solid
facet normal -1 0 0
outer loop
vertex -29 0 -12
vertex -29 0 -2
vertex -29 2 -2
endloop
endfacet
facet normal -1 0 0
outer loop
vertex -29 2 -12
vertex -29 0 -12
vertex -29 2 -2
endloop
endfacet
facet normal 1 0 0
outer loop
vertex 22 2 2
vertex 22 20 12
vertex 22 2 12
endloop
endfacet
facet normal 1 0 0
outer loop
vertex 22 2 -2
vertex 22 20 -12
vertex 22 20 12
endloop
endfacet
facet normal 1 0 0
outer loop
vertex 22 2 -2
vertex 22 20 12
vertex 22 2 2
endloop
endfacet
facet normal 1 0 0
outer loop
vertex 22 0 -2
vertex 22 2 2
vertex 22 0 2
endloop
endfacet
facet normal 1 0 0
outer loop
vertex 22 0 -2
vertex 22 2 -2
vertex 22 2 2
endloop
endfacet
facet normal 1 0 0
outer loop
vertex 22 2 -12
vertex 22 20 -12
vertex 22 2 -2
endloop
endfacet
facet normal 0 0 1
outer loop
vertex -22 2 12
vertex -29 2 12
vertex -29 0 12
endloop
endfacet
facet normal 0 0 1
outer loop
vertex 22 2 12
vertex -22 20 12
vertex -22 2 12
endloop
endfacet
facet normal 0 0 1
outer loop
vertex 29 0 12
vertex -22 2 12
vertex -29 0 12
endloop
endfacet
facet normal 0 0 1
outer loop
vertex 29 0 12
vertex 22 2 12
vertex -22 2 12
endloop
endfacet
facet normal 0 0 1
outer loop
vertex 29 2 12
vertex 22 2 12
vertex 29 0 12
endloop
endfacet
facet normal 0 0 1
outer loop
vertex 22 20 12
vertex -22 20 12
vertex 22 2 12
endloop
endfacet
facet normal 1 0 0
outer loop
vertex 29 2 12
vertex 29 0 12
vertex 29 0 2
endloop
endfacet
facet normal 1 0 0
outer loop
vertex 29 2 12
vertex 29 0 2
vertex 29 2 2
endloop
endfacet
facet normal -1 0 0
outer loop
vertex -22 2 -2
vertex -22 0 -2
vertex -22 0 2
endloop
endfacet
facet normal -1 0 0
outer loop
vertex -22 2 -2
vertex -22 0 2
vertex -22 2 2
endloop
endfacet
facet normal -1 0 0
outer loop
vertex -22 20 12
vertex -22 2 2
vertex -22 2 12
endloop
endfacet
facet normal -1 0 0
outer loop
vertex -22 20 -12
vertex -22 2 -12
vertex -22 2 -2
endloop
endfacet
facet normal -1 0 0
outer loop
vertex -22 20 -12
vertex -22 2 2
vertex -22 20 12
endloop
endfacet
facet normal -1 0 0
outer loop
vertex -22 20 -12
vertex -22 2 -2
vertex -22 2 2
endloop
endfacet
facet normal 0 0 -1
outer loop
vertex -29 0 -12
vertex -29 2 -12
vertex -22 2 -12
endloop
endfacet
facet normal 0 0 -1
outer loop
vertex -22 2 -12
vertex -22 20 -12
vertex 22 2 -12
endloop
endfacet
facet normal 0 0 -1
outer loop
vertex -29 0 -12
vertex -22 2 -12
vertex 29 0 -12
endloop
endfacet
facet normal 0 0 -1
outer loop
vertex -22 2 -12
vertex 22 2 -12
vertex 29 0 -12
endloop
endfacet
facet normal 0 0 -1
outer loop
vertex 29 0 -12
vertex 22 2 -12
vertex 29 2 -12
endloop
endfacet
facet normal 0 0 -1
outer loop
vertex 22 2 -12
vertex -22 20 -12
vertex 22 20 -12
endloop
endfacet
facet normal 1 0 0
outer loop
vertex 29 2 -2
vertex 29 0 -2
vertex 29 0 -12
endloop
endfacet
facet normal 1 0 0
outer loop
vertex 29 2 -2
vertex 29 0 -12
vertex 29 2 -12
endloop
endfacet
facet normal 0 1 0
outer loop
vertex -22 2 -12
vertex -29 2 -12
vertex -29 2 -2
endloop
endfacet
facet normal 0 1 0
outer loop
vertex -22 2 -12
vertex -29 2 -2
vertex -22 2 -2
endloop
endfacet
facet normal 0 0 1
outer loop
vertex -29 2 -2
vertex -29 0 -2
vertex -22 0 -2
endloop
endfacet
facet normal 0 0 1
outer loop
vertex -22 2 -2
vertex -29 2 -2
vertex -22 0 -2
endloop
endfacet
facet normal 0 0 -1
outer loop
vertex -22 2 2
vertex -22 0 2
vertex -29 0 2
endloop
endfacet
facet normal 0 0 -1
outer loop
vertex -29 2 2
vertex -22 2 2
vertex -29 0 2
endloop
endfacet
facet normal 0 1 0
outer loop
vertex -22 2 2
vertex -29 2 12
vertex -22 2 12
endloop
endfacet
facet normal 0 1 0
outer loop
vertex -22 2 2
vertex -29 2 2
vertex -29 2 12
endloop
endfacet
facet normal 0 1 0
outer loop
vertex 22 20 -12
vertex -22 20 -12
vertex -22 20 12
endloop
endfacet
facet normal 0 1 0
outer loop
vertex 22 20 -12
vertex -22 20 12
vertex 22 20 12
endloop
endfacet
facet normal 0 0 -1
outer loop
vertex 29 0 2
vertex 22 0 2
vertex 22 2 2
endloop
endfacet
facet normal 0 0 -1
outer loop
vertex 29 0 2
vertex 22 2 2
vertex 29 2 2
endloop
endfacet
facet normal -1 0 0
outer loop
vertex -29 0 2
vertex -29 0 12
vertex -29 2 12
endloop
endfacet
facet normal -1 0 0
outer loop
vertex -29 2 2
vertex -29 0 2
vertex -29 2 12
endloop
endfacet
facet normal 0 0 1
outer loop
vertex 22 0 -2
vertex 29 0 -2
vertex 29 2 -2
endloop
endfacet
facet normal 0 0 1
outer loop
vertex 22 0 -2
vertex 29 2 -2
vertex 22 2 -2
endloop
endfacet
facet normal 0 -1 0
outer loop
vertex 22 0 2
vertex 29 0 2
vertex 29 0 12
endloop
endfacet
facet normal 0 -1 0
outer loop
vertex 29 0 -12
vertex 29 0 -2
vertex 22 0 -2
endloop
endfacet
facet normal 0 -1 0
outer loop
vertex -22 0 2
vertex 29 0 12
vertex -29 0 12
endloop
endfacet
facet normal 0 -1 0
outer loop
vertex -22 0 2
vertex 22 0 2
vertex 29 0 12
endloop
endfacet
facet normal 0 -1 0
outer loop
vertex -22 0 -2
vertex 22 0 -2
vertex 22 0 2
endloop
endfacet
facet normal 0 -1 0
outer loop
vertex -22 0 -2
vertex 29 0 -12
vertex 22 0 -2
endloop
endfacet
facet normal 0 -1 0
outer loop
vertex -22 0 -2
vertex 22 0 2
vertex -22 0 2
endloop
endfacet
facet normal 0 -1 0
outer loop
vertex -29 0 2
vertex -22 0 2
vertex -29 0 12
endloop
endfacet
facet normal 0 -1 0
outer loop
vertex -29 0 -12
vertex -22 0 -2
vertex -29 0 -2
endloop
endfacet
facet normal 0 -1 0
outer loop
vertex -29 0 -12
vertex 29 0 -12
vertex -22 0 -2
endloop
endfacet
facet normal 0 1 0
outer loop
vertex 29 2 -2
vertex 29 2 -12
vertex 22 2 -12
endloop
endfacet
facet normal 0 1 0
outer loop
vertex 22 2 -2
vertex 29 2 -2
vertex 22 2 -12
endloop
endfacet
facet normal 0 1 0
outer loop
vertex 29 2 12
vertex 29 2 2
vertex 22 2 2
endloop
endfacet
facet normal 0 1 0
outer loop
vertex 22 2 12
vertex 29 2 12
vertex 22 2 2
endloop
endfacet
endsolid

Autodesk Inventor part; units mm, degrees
ref_plane "YZ Plane" through (0, 0, 0) normal (1, 0, 0) x (0, 1, 0)
ref_plane "XZ Plane" through (0, 0, 0) normal (0, 1, 0) x (-1, 0, 0)
ref_plane "XY Plane" through (0, 0, 0) normal (0, 0, 1) x (1, 0, 0)
sketch "Sketch1" plane through (0, 0, 0) normal (0, 0, 1) x (1, 0, 0)
  line L0 (-22, 20) -> (22, 20)
  line L1 (22, 20) -> (22, 0)
  line L2 (22, 0) -> (-22, 0)
  line L3 (-22, 0) -> (-22, 20)
  line L4 (-22, 20) -> (22, 0) construction
  line L5 (22, 20) -> (-22, 0) construction
  line L6 (-29, 2) -> (-22, 2)
  line L7 (-22, 2) -> (-22, 0)
  line L8 (-22, 0) -> (-29, 0)
  line L9 (-29, 0) -> (-29, 2)
  line L10 (-29, 2) -> (-22, 0) construction
  line L11 (-22, 2) -> (-29, 0) construction
  line L12 (29, 2) -> (22, 2)
  line L13 (22, 2) -> (22, 0)
  line L14 (22, 0) -> (29, 0)
  line L15 (29, 0) -> (29, 2)
  line L16 (29, 2) -> (22, 0) construction
  line L17 (22, 2) -> (29, 0) construction
  point P0 (0, 0)
  point P1 (0, 10)
  point P2 (-25.5, 1)
  point P3 (25.5, 1)
  dimension "d0" = 58
  dimension "d1" = 20
  dimension "d2" = 2
  dimension "d3" = 44
extrude "Extrusion1" add sketch "Sketch1" along normal mid plane 24
sketch "Sketch2" plane through (-29, 0, 12) normal (0, -1, 0) x (1, 0, 0)
  line L0 (58, -24) -> (58, 0) projected
  line L1 (51, -10) -> (58, -10)
  line L2 (58, -10) -> (58, -14)
  line L3 (58, -14) -> (51, -14)
  line L4 (51, -14) -> (51, -10)
  line L5 (51, -10) -> (58, -14) construction
  line L6 (58, -10) -> (51, -14) construction
  line L7 (0, -24) -> (0, 0) projected
  line L8 (7, -10) -> (0, -10)
  line L9 (0, -10) -> (0, -14)
  line L10 (0, -14) -> (7, -14)
  line L11 (7, -14) -> (7, -10)
  line L12 (7, -10) -> (0, -14) construction
  line L13 (0, -10) -> (7, -14) construction
  point P0 (29, -12)
  point P1 (54.5, -12)
  point P2 (3.5, -12)
  point P3 (0, -10)
  dimension "d6" = 4
  dimension "d7" = 44
extrude "Extrusion2" cut sketch "Sketch2" against normal blind 24
properties part number "DCDC24Vto15V"
